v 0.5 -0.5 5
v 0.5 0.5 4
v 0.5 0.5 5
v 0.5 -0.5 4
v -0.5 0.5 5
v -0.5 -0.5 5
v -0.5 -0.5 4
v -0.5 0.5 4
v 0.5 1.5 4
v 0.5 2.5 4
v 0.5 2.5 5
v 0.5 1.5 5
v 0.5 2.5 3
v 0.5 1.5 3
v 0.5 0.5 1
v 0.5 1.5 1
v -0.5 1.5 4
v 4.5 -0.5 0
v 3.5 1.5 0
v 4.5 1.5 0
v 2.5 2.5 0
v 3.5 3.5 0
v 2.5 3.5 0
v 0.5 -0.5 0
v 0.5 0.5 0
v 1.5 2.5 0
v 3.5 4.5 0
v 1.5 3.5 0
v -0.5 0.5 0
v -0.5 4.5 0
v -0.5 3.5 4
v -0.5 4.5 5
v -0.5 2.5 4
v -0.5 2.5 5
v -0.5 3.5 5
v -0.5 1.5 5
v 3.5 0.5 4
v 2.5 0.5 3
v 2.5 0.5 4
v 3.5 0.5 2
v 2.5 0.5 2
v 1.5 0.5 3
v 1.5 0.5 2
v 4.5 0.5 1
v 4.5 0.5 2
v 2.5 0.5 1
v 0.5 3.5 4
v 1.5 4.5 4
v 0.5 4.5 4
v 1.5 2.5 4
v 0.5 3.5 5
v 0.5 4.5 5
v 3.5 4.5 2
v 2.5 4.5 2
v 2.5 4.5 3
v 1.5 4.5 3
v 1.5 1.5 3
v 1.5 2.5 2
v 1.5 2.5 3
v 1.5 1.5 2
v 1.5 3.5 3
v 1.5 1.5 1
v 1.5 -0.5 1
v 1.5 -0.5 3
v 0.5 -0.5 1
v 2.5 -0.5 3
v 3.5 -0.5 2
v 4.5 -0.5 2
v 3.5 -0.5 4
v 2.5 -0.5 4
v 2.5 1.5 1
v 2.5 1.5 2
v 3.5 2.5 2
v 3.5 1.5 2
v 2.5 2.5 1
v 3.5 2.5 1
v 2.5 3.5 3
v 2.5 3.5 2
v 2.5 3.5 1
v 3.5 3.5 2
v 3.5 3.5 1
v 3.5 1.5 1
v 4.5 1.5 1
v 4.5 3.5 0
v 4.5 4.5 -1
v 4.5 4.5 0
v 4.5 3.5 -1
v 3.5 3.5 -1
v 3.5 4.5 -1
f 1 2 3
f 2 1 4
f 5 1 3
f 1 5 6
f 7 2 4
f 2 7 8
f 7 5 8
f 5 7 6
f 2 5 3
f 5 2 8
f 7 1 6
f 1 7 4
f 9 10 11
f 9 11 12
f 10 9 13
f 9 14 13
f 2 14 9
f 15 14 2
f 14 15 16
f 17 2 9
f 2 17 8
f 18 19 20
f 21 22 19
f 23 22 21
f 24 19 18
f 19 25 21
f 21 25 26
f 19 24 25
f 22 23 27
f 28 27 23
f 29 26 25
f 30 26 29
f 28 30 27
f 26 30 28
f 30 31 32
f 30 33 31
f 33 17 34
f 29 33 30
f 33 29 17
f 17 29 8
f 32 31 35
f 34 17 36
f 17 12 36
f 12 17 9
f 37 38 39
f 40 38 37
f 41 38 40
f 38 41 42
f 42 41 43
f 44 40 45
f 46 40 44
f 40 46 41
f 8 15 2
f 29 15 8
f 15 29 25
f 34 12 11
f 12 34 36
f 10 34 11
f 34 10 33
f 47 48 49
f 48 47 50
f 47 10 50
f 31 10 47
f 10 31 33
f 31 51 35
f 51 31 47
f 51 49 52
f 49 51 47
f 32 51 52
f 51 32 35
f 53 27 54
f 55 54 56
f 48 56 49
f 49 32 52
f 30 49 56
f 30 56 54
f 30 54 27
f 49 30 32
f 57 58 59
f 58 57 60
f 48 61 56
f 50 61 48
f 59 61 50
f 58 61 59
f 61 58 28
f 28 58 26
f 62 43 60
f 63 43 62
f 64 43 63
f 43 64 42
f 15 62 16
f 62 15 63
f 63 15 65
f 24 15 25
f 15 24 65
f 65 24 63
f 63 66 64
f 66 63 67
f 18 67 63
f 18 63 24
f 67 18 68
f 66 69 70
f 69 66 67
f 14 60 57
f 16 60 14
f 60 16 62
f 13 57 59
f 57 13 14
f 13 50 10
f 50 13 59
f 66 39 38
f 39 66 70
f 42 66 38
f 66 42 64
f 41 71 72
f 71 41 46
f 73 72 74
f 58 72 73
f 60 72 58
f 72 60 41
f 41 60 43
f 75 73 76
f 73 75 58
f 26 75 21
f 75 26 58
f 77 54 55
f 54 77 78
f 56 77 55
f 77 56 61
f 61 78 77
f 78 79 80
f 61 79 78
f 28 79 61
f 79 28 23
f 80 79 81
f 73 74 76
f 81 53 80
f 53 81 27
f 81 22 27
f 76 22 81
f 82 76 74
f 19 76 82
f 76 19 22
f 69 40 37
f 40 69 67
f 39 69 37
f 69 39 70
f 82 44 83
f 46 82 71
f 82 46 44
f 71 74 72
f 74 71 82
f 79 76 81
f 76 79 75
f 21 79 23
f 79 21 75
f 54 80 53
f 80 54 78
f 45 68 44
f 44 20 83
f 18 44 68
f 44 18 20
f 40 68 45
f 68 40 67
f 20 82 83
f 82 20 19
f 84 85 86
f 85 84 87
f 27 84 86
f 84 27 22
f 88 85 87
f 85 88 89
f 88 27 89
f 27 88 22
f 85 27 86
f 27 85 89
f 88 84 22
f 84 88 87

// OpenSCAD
union() {
    translate([0, 0, 4.5]) color([1, 0, 0]) cube([1, 1, 1], center=true);
    translate([0, 1, 2.0]) cube([1, 1, 4], center=true);
    translate([0, 2, 2.5]) cube([1, 1, 5], center=true);
    translate([0, 3, 2.0]) cube([1, 1, 4], center=true);
    translate([0, 4, 2.5]) cube([1, 1, 5], center=true);
    translate([1, 0, 0.5]) cube([1, 1, 1], center=true);
    translate([1, 1, 0.5]) cube([1, 1, 1], center=true);
    translate([1, 2, 1.5]) cube([1, 1, 3], center=true);
    translate([1, 3, 2.0]) cube([1, 1, 4], center=true);
    translate([1, 4, 2.0]) cube([1, 1, 4], center=true);
    translate([2, 0, 1.5]) cube([1, 1, 3], center=true);
    translate([2, 1, 1.0]) cube([1, 1, 2], center=true);
    translate([2, 2, 1.0]) cube([1, 1, 2], center=true);
    translate([2, 4, 1.5]) cube([1, 1, 3], center=true);
    translate([3, 0, 2.0]) cube([1, 1, 4], center=true);
    translate([3, 1, 0.5]) cube([1, 1, 1], center=true);
    translate([3, 2, 1.0]) cube([1, 1, 2], center=true);
    translate([3, 3, 0.5]) cube([1, 1, 1], center=true);
    translate([3, 4, 1.0]) cube([1, 1, 2], center=true);
    translate([4, 0, 1.0]) cube([1, 1, 2], center=true);
    translate([4, 1, 0.5]) cube([1, 1, 1], center=true);
    translate([4, 4, -0.5]) color([0, 0, 1]) cube([1, 1, 1], center=true);
}
